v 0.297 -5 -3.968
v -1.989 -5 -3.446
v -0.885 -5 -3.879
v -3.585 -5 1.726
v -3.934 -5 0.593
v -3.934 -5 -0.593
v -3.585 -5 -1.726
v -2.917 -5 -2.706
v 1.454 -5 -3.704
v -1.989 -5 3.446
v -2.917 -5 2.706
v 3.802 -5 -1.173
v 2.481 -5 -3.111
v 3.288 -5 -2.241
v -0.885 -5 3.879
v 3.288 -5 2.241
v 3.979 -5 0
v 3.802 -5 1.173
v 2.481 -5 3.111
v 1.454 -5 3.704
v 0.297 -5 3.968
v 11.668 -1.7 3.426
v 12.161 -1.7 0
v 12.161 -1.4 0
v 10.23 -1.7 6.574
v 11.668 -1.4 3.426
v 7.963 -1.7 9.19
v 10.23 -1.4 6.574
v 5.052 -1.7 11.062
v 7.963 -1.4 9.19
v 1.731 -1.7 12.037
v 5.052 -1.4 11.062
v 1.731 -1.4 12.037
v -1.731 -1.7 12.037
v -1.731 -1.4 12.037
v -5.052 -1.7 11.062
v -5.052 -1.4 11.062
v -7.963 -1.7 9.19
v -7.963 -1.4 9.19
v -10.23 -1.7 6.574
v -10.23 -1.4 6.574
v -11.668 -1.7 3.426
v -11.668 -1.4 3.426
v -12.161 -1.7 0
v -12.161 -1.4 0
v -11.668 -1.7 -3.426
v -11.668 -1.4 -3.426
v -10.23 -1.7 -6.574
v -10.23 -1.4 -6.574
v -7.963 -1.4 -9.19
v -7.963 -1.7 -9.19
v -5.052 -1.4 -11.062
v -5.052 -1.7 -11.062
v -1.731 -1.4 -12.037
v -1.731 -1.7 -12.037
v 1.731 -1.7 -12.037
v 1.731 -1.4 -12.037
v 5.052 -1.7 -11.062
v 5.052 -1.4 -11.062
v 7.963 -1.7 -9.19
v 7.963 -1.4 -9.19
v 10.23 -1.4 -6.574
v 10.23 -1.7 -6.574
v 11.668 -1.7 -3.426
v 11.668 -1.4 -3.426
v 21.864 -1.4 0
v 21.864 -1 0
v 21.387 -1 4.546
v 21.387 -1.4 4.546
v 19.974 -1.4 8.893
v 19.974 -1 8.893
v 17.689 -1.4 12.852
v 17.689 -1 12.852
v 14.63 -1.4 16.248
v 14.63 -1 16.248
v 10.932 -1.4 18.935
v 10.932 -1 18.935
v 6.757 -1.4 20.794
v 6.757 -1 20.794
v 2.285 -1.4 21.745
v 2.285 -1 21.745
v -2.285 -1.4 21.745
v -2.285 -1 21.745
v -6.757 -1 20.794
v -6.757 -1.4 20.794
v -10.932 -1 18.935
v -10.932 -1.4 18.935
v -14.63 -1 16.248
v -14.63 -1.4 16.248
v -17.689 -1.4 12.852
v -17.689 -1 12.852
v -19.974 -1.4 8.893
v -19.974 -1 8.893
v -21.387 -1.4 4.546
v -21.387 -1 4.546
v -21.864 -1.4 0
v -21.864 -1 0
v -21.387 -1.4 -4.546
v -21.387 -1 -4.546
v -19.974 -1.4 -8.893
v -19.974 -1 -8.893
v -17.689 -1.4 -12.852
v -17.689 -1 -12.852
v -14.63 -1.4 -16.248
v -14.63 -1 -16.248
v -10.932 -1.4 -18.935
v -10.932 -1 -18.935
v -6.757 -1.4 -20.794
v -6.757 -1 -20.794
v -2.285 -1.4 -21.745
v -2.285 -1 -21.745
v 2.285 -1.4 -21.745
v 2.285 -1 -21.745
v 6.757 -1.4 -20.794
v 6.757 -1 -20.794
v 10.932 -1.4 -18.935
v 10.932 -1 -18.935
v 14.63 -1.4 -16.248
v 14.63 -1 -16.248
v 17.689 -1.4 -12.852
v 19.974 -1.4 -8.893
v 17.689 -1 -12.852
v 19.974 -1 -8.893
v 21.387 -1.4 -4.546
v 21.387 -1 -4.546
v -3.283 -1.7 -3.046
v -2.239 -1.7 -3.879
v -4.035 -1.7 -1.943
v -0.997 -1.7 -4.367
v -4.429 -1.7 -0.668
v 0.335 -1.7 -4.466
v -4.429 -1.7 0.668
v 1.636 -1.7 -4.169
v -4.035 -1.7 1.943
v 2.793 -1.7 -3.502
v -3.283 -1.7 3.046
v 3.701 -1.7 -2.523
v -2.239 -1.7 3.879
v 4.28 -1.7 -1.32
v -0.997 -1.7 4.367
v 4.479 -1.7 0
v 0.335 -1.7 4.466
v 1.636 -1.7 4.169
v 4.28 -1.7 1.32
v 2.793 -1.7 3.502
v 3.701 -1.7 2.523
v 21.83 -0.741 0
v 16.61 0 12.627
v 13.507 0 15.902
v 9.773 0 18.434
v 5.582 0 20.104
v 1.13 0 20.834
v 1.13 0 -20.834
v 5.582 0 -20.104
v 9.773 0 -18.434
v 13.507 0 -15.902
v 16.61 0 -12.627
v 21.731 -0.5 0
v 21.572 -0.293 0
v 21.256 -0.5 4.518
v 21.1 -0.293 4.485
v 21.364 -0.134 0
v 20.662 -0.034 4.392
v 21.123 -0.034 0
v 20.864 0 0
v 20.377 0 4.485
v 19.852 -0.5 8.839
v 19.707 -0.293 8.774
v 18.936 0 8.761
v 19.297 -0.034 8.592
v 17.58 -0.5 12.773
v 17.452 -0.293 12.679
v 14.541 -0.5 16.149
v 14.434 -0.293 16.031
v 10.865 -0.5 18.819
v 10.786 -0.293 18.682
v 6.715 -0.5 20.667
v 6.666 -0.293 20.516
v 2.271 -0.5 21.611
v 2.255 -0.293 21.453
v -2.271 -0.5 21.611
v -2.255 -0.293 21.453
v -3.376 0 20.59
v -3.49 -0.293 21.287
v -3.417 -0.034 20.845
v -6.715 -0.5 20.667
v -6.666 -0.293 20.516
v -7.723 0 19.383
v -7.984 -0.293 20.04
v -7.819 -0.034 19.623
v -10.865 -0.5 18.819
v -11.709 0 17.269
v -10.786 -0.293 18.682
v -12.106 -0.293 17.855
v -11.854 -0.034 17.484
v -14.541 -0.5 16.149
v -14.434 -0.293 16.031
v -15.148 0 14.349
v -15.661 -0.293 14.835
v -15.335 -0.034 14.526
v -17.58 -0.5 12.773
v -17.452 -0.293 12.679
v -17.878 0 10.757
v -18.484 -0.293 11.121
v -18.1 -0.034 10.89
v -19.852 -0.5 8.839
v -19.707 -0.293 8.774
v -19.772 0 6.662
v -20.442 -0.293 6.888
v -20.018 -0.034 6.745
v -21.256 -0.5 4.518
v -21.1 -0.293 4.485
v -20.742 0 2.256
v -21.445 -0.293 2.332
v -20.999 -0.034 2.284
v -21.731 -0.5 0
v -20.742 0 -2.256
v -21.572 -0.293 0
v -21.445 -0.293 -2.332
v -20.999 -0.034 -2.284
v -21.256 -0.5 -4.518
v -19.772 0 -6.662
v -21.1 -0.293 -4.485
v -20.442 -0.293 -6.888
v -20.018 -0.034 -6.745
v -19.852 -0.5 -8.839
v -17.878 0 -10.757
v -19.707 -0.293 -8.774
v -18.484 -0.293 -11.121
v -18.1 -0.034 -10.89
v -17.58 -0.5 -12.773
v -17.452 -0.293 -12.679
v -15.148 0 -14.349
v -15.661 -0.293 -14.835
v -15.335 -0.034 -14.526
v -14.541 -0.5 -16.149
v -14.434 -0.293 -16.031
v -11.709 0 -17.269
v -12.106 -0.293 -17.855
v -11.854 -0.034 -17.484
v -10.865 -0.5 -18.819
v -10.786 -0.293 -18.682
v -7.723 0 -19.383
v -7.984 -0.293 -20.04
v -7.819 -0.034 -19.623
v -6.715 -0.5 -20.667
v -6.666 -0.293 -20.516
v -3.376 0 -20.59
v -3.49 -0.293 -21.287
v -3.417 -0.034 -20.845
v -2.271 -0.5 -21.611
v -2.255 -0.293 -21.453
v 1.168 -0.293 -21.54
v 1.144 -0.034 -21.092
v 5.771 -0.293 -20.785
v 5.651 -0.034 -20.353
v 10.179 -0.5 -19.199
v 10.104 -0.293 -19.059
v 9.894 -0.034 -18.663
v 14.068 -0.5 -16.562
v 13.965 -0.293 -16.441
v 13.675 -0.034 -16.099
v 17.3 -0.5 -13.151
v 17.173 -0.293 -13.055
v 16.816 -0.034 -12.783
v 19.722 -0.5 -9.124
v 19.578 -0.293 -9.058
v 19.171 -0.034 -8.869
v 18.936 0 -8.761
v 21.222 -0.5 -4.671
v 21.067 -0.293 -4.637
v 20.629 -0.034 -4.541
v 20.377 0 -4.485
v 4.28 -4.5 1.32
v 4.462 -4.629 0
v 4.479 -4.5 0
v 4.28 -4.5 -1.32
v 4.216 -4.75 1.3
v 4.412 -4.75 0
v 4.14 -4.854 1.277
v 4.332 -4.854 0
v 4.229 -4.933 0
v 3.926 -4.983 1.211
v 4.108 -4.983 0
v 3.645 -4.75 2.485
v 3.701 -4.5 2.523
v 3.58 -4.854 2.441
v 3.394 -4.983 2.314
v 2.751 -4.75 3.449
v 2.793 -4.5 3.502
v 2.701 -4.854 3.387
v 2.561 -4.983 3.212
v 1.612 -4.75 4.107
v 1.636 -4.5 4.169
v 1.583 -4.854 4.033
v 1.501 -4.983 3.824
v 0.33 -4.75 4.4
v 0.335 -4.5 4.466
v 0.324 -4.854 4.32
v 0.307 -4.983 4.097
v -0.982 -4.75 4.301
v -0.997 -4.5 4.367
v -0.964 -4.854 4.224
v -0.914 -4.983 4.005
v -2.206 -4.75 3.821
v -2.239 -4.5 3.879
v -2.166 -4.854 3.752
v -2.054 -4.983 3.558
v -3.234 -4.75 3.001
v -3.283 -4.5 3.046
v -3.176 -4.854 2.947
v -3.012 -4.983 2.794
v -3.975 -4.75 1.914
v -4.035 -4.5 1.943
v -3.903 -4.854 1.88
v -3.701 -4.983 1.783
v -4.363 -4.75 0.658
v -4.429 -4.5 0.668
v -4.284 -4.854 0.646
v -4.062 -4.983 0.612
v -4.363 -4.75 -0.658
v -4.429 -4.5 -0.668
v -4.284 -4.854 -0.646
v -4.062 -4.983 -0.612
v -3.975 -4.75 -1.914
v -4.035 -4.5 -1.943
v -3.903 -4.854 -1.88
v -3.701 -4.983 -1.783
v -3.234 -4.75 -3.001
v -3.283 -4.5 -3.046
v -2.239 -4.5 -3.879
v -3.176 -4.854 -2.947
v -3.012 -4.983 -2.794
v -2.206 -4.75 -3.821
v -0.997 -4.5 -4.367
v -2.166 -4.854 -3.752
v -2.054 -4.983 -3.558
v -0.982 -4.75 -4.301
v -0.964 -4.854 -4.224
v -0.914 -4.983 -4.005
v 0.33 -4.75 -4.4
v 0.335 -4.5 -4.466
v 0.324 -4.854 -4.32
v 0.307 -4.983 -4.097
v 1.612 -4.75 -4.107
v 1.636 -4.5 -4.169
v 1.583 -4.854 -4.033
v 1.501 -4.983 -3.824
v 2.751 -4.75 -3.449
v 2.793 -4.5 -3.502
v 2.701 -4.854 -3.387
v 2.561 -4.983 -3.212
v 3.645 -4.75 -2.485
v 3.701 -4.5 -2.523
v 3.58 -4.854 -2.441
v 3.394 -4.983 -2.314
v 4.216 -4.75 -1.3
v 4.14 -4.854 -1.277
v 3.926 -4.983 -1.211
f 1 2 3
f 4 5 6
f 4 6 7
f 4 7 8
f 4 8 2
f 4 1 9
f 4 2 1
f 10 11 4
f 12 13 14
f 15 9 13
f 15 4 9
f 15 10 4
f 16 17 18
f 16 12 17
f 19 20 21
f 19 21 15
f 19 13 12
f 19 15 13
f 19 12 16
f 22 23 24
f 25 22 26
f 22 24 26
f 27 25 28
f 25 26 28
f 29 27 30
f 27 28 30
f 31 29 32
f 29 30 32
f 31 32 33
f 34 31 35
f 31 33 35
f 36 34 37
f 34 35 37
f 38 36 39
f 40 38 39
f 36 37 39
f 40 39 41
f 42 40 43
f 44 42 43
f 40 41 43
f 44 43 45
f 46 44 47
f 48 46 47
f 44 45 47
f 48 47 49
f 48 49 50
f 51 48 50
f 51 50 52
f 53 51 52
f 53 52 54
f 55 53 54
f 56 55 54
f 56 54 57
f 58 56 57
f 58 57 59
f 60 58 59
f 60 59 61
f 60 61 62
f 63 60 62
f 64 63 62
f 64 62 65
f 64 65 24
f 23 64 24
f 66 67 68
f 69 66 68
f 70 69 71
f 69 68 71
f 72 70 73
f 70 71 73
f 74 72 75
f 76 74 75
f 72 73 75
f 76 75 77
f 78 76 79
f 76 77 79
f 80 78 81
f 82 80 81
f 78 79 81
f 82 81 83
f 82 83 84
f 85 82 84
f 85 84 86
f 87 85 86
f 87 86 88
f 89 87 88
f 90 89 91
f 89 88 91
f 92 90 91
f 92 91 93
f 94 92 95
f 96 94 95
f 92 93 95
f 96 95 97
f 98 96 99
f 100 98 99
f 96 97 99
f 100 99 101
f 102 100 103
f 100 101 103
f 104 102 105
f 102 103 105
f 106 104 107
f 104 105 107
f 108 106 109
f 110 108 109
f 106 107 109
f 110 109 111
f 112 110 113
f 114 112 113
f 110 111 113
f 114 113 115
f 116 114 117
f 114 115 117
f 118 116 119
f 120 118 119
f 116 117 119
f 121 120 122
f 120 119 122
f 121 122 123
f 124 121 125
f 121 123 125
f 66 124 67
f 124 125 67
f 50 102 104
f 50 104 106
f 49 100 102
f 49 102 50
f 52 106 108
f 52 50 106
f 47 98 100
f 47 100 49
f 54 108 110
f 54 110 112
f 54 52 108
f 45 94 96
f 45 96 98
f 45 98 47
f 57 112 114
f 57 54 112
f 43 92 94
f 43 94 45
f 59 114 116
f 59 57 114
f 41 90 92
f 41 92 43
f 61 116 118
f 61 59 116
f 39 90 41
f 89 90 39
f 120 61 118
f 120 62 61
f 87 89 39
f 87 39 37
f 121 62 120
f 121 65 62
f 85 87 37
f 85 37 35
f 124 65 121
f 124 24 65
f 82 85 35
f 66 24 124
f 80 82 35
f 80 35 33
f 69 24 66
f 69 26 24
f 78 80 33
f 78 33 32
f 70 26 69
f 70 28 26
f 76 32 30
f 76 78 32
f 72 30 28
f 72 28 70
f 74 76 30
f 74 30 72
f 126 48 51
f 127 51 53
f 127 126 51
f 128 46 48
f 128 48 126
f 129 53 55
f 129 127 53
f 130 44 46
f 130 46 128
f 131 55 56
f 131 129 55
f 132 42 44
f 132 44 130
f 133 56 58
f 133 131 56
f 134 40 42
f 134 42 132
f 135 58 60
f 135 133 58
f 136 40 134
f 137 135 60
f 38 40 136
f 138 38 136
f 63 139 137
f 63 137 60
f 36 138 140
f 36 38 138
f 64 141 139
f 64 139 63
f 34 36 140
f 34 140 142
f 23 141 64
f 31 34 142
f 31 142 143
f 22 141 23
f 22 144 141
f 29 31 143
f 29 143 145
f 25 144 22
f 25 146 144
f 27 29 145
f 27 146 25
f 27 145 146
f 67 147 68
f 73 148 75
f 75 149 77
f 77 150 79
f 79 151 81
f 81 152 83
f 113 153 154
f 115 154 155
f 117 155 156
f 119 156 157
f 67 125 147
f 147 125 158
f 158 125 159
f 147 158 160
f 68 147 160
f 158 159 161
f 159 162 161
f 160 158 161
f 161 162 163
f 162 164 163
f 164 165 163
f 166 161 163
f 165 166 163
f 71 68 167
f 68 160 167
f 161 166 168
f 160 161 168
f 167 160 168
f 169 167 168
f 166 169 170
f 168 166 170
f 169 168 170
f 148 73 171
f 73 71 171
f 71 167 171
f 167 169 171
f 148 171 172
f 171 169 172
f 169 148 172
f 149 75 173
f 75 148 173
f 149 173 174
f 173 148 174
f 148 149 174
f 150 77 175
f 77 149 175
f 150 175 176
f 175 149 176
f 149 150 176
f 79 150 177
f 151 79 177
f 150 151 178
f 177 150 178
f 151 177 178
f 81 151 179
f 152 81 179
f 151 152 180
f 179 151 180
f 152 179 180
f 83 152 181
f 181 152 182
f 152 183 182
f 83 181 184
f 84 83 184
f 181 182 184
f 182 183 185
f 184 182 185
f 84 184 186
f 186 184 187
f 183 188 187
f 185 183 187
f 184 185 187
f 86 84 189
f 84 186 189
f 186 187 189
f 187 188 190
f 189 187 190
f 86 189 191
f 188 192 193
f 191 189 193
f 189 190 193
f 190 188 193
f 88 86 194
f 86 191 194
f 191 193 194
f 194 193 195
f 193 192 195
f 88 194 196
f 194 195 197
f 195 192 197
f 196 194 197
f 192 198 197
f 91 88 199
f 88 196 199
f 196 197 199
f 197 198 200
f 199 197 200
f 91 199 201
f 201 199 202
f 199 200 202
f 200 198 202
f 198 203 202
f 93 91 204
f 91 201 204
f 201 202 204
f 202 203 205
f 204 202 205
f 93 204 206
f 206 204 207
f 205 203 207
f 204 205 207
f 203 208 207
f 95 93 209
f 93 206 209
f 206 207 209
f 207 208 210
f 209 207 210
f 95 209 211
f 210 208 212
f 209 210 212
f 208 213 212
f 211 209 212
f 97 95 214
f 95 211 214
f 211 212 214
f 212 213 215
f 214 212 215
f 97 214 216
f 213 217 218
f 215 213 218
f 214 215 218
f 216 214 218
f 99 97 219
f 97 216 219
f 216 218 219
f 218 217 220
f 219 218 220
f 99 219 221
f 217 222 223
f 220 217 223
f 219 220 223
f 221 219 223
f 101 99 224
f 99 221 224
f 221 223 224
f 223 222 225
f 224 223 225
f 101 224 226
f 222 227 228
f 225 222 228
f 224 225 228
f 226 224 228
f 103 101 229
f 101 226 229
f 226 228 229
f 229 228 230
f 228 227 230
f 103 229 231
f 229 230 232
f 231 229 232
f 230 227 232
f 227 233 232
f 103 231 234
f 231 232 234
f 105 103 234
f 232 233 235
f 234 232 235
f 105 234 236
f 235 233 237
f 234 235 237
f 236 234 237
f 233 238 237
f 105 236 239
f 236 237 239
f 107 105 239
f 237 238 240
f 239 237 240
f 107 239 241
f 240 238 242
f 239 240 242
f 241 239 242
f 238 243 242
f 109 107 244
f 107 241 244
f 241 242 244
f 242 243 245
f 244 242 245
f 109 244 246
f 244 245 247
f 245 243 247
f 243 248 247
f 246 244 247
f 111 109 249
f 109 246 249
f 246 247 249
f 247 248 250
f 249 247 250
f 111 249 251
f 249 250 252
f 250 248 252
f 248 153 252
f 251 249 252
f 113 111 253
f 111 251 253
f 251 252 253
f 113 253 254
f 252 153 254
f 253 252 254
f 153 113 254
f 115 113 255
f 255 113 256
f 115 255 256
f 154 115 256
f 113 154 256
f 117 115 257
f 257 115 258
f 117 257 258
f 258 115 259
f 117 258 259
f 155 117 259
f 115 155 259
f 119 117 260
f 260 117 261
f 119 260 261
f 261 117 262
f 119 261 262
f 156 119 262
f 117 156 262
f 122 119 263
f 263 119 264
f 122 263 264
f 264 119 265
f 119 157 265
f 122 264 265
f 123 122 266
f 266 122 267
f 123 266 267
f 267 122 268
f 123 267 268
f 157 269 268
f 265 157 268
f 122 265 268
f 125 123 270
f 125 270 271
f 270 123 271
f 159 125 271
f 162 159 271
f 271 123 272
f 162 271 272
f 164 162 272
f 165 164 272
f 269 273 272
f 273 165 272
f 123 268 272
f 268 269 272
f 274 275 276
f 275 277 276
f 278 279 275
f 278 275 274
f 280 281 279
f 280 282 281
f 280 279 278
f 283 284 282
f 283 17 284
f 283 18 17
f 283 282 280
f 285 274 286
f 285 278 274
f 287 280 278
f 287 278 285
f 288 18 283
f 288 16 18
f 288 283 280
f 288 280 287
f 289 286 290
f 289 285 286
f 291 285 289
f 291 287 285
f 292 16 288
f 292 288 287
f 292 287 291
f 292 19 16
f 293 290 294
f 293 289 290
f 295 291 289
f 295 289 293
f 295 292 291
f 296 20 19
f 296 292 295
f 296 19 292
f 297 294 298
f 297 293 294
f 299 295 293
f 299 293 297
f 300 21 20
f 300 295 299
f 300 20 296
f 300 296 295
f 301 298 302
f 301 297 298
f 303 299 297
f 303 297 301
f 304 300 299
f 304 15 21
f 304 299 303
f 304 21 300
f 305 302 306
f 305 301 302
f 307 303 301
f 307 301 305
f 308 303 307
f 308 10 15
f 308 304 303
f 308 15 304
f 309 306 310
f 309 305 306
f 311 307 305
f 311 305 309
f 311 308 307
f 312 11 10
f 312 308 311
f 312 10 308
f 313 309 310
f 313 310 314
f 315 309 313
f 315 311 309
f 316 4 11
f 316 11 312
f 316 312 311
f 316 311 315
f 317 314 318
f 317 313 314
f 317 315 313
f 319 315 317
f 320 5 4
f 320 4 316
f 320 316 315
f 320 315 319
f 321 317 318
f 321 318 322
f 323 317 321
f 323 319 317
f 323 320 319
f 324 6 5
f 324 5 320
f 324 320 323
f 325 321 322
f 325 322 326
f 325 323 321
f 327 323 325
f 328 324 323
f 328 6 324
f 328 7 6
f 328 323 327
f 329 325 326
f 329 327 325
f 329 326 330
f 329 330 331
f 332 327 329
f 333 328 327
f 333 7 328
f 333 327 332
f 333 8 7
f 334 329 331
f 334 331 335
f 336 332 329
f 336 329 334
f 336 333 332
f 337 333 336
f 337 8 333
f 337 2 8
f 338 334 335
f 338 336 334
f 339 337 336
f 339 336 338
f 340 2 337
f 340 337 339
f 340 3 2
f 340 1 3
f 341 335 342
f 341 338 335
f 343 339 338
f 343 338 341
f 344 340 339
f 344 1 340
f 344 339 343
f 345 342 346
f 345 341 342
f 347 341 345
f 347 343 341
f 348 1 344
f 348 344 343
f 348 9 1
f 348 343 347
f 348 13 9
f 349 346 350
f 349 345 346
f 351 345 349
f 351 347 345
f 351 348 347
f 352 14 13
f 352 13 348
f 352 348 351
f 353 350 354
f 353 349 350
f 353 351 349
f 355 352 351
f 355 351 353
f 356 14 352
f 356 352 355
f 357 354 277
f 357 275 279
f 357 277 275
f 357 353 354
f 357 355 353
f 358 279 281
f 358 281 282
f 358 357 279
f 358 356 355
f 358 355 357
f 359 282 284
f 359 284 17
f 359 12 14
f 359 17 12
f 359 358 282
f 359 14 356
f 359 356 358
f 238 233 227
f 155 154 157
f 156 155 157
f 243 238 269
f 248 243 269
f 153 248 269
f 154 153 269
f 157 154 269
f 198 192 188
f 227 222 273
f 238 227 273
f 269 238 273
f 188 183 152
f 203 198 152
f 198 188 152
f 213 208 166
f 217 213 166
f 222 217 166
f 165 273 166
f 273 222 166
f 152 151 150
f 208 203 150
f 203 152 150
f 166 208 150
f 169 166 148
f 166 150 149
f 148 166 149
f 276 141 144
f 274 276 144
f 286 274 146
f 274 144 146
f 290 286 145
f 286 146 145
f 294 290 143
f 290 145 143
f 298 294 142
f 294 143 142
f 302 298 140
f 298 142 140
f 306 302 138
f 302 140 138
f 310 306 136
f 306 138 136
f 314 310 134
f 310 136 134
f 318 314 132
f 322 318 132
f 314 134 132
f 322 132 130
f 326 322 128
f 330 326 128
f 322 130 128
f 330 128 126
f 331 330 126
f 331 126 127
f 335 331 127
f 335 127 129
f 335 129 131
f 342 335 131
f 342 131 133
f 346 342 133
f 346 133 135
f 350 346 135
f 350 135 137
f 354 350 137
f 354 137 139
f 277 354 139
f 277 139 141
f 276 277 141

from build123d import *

# Parameters (mm, degrees)
F2_R     = 4.478894
F3_DEPTH = 5
F1_R     = 12.160504
F4_DEPTH = 1.7
F0_R     = 21.8645
F5_DEPTH = 1.4
F6_R     = 1
F7_R     = 0.5


with BuildPart() as f3:
    # F2 (on Front) → F3 (new body)
    with BuildSketch(Plane.XZ):
        Circle(F2_R)
    extrude(amount=F3_DEPTH)

    # F1 (on Front) → F4 (join)
    with BuildSketch(Plane.XZ):
        Circle(F1_R)
    extrude(amount=F4_DEPTH)

    # F0 (on Front) → F5 (join)
    with BuildSketch(Plane.XZ):
        Circle(F0_R)
    extrude(amount=F5_DEPTH)

    # F6
    f6_edges = [f3.edges().sort_by_distance(p)[0] for p in [
        (-21.8645, 0, 0),
    ]]
    fillet(f6_edges, radius=F6_R)

    # F7
    f7_edges = [f3.edges().sort_by_distance(p)[0] for p in [
        (-4.478894, -5, 0),
    ]]
    fillet(f7_edges, radius=F7_R)


solid = f3.part
